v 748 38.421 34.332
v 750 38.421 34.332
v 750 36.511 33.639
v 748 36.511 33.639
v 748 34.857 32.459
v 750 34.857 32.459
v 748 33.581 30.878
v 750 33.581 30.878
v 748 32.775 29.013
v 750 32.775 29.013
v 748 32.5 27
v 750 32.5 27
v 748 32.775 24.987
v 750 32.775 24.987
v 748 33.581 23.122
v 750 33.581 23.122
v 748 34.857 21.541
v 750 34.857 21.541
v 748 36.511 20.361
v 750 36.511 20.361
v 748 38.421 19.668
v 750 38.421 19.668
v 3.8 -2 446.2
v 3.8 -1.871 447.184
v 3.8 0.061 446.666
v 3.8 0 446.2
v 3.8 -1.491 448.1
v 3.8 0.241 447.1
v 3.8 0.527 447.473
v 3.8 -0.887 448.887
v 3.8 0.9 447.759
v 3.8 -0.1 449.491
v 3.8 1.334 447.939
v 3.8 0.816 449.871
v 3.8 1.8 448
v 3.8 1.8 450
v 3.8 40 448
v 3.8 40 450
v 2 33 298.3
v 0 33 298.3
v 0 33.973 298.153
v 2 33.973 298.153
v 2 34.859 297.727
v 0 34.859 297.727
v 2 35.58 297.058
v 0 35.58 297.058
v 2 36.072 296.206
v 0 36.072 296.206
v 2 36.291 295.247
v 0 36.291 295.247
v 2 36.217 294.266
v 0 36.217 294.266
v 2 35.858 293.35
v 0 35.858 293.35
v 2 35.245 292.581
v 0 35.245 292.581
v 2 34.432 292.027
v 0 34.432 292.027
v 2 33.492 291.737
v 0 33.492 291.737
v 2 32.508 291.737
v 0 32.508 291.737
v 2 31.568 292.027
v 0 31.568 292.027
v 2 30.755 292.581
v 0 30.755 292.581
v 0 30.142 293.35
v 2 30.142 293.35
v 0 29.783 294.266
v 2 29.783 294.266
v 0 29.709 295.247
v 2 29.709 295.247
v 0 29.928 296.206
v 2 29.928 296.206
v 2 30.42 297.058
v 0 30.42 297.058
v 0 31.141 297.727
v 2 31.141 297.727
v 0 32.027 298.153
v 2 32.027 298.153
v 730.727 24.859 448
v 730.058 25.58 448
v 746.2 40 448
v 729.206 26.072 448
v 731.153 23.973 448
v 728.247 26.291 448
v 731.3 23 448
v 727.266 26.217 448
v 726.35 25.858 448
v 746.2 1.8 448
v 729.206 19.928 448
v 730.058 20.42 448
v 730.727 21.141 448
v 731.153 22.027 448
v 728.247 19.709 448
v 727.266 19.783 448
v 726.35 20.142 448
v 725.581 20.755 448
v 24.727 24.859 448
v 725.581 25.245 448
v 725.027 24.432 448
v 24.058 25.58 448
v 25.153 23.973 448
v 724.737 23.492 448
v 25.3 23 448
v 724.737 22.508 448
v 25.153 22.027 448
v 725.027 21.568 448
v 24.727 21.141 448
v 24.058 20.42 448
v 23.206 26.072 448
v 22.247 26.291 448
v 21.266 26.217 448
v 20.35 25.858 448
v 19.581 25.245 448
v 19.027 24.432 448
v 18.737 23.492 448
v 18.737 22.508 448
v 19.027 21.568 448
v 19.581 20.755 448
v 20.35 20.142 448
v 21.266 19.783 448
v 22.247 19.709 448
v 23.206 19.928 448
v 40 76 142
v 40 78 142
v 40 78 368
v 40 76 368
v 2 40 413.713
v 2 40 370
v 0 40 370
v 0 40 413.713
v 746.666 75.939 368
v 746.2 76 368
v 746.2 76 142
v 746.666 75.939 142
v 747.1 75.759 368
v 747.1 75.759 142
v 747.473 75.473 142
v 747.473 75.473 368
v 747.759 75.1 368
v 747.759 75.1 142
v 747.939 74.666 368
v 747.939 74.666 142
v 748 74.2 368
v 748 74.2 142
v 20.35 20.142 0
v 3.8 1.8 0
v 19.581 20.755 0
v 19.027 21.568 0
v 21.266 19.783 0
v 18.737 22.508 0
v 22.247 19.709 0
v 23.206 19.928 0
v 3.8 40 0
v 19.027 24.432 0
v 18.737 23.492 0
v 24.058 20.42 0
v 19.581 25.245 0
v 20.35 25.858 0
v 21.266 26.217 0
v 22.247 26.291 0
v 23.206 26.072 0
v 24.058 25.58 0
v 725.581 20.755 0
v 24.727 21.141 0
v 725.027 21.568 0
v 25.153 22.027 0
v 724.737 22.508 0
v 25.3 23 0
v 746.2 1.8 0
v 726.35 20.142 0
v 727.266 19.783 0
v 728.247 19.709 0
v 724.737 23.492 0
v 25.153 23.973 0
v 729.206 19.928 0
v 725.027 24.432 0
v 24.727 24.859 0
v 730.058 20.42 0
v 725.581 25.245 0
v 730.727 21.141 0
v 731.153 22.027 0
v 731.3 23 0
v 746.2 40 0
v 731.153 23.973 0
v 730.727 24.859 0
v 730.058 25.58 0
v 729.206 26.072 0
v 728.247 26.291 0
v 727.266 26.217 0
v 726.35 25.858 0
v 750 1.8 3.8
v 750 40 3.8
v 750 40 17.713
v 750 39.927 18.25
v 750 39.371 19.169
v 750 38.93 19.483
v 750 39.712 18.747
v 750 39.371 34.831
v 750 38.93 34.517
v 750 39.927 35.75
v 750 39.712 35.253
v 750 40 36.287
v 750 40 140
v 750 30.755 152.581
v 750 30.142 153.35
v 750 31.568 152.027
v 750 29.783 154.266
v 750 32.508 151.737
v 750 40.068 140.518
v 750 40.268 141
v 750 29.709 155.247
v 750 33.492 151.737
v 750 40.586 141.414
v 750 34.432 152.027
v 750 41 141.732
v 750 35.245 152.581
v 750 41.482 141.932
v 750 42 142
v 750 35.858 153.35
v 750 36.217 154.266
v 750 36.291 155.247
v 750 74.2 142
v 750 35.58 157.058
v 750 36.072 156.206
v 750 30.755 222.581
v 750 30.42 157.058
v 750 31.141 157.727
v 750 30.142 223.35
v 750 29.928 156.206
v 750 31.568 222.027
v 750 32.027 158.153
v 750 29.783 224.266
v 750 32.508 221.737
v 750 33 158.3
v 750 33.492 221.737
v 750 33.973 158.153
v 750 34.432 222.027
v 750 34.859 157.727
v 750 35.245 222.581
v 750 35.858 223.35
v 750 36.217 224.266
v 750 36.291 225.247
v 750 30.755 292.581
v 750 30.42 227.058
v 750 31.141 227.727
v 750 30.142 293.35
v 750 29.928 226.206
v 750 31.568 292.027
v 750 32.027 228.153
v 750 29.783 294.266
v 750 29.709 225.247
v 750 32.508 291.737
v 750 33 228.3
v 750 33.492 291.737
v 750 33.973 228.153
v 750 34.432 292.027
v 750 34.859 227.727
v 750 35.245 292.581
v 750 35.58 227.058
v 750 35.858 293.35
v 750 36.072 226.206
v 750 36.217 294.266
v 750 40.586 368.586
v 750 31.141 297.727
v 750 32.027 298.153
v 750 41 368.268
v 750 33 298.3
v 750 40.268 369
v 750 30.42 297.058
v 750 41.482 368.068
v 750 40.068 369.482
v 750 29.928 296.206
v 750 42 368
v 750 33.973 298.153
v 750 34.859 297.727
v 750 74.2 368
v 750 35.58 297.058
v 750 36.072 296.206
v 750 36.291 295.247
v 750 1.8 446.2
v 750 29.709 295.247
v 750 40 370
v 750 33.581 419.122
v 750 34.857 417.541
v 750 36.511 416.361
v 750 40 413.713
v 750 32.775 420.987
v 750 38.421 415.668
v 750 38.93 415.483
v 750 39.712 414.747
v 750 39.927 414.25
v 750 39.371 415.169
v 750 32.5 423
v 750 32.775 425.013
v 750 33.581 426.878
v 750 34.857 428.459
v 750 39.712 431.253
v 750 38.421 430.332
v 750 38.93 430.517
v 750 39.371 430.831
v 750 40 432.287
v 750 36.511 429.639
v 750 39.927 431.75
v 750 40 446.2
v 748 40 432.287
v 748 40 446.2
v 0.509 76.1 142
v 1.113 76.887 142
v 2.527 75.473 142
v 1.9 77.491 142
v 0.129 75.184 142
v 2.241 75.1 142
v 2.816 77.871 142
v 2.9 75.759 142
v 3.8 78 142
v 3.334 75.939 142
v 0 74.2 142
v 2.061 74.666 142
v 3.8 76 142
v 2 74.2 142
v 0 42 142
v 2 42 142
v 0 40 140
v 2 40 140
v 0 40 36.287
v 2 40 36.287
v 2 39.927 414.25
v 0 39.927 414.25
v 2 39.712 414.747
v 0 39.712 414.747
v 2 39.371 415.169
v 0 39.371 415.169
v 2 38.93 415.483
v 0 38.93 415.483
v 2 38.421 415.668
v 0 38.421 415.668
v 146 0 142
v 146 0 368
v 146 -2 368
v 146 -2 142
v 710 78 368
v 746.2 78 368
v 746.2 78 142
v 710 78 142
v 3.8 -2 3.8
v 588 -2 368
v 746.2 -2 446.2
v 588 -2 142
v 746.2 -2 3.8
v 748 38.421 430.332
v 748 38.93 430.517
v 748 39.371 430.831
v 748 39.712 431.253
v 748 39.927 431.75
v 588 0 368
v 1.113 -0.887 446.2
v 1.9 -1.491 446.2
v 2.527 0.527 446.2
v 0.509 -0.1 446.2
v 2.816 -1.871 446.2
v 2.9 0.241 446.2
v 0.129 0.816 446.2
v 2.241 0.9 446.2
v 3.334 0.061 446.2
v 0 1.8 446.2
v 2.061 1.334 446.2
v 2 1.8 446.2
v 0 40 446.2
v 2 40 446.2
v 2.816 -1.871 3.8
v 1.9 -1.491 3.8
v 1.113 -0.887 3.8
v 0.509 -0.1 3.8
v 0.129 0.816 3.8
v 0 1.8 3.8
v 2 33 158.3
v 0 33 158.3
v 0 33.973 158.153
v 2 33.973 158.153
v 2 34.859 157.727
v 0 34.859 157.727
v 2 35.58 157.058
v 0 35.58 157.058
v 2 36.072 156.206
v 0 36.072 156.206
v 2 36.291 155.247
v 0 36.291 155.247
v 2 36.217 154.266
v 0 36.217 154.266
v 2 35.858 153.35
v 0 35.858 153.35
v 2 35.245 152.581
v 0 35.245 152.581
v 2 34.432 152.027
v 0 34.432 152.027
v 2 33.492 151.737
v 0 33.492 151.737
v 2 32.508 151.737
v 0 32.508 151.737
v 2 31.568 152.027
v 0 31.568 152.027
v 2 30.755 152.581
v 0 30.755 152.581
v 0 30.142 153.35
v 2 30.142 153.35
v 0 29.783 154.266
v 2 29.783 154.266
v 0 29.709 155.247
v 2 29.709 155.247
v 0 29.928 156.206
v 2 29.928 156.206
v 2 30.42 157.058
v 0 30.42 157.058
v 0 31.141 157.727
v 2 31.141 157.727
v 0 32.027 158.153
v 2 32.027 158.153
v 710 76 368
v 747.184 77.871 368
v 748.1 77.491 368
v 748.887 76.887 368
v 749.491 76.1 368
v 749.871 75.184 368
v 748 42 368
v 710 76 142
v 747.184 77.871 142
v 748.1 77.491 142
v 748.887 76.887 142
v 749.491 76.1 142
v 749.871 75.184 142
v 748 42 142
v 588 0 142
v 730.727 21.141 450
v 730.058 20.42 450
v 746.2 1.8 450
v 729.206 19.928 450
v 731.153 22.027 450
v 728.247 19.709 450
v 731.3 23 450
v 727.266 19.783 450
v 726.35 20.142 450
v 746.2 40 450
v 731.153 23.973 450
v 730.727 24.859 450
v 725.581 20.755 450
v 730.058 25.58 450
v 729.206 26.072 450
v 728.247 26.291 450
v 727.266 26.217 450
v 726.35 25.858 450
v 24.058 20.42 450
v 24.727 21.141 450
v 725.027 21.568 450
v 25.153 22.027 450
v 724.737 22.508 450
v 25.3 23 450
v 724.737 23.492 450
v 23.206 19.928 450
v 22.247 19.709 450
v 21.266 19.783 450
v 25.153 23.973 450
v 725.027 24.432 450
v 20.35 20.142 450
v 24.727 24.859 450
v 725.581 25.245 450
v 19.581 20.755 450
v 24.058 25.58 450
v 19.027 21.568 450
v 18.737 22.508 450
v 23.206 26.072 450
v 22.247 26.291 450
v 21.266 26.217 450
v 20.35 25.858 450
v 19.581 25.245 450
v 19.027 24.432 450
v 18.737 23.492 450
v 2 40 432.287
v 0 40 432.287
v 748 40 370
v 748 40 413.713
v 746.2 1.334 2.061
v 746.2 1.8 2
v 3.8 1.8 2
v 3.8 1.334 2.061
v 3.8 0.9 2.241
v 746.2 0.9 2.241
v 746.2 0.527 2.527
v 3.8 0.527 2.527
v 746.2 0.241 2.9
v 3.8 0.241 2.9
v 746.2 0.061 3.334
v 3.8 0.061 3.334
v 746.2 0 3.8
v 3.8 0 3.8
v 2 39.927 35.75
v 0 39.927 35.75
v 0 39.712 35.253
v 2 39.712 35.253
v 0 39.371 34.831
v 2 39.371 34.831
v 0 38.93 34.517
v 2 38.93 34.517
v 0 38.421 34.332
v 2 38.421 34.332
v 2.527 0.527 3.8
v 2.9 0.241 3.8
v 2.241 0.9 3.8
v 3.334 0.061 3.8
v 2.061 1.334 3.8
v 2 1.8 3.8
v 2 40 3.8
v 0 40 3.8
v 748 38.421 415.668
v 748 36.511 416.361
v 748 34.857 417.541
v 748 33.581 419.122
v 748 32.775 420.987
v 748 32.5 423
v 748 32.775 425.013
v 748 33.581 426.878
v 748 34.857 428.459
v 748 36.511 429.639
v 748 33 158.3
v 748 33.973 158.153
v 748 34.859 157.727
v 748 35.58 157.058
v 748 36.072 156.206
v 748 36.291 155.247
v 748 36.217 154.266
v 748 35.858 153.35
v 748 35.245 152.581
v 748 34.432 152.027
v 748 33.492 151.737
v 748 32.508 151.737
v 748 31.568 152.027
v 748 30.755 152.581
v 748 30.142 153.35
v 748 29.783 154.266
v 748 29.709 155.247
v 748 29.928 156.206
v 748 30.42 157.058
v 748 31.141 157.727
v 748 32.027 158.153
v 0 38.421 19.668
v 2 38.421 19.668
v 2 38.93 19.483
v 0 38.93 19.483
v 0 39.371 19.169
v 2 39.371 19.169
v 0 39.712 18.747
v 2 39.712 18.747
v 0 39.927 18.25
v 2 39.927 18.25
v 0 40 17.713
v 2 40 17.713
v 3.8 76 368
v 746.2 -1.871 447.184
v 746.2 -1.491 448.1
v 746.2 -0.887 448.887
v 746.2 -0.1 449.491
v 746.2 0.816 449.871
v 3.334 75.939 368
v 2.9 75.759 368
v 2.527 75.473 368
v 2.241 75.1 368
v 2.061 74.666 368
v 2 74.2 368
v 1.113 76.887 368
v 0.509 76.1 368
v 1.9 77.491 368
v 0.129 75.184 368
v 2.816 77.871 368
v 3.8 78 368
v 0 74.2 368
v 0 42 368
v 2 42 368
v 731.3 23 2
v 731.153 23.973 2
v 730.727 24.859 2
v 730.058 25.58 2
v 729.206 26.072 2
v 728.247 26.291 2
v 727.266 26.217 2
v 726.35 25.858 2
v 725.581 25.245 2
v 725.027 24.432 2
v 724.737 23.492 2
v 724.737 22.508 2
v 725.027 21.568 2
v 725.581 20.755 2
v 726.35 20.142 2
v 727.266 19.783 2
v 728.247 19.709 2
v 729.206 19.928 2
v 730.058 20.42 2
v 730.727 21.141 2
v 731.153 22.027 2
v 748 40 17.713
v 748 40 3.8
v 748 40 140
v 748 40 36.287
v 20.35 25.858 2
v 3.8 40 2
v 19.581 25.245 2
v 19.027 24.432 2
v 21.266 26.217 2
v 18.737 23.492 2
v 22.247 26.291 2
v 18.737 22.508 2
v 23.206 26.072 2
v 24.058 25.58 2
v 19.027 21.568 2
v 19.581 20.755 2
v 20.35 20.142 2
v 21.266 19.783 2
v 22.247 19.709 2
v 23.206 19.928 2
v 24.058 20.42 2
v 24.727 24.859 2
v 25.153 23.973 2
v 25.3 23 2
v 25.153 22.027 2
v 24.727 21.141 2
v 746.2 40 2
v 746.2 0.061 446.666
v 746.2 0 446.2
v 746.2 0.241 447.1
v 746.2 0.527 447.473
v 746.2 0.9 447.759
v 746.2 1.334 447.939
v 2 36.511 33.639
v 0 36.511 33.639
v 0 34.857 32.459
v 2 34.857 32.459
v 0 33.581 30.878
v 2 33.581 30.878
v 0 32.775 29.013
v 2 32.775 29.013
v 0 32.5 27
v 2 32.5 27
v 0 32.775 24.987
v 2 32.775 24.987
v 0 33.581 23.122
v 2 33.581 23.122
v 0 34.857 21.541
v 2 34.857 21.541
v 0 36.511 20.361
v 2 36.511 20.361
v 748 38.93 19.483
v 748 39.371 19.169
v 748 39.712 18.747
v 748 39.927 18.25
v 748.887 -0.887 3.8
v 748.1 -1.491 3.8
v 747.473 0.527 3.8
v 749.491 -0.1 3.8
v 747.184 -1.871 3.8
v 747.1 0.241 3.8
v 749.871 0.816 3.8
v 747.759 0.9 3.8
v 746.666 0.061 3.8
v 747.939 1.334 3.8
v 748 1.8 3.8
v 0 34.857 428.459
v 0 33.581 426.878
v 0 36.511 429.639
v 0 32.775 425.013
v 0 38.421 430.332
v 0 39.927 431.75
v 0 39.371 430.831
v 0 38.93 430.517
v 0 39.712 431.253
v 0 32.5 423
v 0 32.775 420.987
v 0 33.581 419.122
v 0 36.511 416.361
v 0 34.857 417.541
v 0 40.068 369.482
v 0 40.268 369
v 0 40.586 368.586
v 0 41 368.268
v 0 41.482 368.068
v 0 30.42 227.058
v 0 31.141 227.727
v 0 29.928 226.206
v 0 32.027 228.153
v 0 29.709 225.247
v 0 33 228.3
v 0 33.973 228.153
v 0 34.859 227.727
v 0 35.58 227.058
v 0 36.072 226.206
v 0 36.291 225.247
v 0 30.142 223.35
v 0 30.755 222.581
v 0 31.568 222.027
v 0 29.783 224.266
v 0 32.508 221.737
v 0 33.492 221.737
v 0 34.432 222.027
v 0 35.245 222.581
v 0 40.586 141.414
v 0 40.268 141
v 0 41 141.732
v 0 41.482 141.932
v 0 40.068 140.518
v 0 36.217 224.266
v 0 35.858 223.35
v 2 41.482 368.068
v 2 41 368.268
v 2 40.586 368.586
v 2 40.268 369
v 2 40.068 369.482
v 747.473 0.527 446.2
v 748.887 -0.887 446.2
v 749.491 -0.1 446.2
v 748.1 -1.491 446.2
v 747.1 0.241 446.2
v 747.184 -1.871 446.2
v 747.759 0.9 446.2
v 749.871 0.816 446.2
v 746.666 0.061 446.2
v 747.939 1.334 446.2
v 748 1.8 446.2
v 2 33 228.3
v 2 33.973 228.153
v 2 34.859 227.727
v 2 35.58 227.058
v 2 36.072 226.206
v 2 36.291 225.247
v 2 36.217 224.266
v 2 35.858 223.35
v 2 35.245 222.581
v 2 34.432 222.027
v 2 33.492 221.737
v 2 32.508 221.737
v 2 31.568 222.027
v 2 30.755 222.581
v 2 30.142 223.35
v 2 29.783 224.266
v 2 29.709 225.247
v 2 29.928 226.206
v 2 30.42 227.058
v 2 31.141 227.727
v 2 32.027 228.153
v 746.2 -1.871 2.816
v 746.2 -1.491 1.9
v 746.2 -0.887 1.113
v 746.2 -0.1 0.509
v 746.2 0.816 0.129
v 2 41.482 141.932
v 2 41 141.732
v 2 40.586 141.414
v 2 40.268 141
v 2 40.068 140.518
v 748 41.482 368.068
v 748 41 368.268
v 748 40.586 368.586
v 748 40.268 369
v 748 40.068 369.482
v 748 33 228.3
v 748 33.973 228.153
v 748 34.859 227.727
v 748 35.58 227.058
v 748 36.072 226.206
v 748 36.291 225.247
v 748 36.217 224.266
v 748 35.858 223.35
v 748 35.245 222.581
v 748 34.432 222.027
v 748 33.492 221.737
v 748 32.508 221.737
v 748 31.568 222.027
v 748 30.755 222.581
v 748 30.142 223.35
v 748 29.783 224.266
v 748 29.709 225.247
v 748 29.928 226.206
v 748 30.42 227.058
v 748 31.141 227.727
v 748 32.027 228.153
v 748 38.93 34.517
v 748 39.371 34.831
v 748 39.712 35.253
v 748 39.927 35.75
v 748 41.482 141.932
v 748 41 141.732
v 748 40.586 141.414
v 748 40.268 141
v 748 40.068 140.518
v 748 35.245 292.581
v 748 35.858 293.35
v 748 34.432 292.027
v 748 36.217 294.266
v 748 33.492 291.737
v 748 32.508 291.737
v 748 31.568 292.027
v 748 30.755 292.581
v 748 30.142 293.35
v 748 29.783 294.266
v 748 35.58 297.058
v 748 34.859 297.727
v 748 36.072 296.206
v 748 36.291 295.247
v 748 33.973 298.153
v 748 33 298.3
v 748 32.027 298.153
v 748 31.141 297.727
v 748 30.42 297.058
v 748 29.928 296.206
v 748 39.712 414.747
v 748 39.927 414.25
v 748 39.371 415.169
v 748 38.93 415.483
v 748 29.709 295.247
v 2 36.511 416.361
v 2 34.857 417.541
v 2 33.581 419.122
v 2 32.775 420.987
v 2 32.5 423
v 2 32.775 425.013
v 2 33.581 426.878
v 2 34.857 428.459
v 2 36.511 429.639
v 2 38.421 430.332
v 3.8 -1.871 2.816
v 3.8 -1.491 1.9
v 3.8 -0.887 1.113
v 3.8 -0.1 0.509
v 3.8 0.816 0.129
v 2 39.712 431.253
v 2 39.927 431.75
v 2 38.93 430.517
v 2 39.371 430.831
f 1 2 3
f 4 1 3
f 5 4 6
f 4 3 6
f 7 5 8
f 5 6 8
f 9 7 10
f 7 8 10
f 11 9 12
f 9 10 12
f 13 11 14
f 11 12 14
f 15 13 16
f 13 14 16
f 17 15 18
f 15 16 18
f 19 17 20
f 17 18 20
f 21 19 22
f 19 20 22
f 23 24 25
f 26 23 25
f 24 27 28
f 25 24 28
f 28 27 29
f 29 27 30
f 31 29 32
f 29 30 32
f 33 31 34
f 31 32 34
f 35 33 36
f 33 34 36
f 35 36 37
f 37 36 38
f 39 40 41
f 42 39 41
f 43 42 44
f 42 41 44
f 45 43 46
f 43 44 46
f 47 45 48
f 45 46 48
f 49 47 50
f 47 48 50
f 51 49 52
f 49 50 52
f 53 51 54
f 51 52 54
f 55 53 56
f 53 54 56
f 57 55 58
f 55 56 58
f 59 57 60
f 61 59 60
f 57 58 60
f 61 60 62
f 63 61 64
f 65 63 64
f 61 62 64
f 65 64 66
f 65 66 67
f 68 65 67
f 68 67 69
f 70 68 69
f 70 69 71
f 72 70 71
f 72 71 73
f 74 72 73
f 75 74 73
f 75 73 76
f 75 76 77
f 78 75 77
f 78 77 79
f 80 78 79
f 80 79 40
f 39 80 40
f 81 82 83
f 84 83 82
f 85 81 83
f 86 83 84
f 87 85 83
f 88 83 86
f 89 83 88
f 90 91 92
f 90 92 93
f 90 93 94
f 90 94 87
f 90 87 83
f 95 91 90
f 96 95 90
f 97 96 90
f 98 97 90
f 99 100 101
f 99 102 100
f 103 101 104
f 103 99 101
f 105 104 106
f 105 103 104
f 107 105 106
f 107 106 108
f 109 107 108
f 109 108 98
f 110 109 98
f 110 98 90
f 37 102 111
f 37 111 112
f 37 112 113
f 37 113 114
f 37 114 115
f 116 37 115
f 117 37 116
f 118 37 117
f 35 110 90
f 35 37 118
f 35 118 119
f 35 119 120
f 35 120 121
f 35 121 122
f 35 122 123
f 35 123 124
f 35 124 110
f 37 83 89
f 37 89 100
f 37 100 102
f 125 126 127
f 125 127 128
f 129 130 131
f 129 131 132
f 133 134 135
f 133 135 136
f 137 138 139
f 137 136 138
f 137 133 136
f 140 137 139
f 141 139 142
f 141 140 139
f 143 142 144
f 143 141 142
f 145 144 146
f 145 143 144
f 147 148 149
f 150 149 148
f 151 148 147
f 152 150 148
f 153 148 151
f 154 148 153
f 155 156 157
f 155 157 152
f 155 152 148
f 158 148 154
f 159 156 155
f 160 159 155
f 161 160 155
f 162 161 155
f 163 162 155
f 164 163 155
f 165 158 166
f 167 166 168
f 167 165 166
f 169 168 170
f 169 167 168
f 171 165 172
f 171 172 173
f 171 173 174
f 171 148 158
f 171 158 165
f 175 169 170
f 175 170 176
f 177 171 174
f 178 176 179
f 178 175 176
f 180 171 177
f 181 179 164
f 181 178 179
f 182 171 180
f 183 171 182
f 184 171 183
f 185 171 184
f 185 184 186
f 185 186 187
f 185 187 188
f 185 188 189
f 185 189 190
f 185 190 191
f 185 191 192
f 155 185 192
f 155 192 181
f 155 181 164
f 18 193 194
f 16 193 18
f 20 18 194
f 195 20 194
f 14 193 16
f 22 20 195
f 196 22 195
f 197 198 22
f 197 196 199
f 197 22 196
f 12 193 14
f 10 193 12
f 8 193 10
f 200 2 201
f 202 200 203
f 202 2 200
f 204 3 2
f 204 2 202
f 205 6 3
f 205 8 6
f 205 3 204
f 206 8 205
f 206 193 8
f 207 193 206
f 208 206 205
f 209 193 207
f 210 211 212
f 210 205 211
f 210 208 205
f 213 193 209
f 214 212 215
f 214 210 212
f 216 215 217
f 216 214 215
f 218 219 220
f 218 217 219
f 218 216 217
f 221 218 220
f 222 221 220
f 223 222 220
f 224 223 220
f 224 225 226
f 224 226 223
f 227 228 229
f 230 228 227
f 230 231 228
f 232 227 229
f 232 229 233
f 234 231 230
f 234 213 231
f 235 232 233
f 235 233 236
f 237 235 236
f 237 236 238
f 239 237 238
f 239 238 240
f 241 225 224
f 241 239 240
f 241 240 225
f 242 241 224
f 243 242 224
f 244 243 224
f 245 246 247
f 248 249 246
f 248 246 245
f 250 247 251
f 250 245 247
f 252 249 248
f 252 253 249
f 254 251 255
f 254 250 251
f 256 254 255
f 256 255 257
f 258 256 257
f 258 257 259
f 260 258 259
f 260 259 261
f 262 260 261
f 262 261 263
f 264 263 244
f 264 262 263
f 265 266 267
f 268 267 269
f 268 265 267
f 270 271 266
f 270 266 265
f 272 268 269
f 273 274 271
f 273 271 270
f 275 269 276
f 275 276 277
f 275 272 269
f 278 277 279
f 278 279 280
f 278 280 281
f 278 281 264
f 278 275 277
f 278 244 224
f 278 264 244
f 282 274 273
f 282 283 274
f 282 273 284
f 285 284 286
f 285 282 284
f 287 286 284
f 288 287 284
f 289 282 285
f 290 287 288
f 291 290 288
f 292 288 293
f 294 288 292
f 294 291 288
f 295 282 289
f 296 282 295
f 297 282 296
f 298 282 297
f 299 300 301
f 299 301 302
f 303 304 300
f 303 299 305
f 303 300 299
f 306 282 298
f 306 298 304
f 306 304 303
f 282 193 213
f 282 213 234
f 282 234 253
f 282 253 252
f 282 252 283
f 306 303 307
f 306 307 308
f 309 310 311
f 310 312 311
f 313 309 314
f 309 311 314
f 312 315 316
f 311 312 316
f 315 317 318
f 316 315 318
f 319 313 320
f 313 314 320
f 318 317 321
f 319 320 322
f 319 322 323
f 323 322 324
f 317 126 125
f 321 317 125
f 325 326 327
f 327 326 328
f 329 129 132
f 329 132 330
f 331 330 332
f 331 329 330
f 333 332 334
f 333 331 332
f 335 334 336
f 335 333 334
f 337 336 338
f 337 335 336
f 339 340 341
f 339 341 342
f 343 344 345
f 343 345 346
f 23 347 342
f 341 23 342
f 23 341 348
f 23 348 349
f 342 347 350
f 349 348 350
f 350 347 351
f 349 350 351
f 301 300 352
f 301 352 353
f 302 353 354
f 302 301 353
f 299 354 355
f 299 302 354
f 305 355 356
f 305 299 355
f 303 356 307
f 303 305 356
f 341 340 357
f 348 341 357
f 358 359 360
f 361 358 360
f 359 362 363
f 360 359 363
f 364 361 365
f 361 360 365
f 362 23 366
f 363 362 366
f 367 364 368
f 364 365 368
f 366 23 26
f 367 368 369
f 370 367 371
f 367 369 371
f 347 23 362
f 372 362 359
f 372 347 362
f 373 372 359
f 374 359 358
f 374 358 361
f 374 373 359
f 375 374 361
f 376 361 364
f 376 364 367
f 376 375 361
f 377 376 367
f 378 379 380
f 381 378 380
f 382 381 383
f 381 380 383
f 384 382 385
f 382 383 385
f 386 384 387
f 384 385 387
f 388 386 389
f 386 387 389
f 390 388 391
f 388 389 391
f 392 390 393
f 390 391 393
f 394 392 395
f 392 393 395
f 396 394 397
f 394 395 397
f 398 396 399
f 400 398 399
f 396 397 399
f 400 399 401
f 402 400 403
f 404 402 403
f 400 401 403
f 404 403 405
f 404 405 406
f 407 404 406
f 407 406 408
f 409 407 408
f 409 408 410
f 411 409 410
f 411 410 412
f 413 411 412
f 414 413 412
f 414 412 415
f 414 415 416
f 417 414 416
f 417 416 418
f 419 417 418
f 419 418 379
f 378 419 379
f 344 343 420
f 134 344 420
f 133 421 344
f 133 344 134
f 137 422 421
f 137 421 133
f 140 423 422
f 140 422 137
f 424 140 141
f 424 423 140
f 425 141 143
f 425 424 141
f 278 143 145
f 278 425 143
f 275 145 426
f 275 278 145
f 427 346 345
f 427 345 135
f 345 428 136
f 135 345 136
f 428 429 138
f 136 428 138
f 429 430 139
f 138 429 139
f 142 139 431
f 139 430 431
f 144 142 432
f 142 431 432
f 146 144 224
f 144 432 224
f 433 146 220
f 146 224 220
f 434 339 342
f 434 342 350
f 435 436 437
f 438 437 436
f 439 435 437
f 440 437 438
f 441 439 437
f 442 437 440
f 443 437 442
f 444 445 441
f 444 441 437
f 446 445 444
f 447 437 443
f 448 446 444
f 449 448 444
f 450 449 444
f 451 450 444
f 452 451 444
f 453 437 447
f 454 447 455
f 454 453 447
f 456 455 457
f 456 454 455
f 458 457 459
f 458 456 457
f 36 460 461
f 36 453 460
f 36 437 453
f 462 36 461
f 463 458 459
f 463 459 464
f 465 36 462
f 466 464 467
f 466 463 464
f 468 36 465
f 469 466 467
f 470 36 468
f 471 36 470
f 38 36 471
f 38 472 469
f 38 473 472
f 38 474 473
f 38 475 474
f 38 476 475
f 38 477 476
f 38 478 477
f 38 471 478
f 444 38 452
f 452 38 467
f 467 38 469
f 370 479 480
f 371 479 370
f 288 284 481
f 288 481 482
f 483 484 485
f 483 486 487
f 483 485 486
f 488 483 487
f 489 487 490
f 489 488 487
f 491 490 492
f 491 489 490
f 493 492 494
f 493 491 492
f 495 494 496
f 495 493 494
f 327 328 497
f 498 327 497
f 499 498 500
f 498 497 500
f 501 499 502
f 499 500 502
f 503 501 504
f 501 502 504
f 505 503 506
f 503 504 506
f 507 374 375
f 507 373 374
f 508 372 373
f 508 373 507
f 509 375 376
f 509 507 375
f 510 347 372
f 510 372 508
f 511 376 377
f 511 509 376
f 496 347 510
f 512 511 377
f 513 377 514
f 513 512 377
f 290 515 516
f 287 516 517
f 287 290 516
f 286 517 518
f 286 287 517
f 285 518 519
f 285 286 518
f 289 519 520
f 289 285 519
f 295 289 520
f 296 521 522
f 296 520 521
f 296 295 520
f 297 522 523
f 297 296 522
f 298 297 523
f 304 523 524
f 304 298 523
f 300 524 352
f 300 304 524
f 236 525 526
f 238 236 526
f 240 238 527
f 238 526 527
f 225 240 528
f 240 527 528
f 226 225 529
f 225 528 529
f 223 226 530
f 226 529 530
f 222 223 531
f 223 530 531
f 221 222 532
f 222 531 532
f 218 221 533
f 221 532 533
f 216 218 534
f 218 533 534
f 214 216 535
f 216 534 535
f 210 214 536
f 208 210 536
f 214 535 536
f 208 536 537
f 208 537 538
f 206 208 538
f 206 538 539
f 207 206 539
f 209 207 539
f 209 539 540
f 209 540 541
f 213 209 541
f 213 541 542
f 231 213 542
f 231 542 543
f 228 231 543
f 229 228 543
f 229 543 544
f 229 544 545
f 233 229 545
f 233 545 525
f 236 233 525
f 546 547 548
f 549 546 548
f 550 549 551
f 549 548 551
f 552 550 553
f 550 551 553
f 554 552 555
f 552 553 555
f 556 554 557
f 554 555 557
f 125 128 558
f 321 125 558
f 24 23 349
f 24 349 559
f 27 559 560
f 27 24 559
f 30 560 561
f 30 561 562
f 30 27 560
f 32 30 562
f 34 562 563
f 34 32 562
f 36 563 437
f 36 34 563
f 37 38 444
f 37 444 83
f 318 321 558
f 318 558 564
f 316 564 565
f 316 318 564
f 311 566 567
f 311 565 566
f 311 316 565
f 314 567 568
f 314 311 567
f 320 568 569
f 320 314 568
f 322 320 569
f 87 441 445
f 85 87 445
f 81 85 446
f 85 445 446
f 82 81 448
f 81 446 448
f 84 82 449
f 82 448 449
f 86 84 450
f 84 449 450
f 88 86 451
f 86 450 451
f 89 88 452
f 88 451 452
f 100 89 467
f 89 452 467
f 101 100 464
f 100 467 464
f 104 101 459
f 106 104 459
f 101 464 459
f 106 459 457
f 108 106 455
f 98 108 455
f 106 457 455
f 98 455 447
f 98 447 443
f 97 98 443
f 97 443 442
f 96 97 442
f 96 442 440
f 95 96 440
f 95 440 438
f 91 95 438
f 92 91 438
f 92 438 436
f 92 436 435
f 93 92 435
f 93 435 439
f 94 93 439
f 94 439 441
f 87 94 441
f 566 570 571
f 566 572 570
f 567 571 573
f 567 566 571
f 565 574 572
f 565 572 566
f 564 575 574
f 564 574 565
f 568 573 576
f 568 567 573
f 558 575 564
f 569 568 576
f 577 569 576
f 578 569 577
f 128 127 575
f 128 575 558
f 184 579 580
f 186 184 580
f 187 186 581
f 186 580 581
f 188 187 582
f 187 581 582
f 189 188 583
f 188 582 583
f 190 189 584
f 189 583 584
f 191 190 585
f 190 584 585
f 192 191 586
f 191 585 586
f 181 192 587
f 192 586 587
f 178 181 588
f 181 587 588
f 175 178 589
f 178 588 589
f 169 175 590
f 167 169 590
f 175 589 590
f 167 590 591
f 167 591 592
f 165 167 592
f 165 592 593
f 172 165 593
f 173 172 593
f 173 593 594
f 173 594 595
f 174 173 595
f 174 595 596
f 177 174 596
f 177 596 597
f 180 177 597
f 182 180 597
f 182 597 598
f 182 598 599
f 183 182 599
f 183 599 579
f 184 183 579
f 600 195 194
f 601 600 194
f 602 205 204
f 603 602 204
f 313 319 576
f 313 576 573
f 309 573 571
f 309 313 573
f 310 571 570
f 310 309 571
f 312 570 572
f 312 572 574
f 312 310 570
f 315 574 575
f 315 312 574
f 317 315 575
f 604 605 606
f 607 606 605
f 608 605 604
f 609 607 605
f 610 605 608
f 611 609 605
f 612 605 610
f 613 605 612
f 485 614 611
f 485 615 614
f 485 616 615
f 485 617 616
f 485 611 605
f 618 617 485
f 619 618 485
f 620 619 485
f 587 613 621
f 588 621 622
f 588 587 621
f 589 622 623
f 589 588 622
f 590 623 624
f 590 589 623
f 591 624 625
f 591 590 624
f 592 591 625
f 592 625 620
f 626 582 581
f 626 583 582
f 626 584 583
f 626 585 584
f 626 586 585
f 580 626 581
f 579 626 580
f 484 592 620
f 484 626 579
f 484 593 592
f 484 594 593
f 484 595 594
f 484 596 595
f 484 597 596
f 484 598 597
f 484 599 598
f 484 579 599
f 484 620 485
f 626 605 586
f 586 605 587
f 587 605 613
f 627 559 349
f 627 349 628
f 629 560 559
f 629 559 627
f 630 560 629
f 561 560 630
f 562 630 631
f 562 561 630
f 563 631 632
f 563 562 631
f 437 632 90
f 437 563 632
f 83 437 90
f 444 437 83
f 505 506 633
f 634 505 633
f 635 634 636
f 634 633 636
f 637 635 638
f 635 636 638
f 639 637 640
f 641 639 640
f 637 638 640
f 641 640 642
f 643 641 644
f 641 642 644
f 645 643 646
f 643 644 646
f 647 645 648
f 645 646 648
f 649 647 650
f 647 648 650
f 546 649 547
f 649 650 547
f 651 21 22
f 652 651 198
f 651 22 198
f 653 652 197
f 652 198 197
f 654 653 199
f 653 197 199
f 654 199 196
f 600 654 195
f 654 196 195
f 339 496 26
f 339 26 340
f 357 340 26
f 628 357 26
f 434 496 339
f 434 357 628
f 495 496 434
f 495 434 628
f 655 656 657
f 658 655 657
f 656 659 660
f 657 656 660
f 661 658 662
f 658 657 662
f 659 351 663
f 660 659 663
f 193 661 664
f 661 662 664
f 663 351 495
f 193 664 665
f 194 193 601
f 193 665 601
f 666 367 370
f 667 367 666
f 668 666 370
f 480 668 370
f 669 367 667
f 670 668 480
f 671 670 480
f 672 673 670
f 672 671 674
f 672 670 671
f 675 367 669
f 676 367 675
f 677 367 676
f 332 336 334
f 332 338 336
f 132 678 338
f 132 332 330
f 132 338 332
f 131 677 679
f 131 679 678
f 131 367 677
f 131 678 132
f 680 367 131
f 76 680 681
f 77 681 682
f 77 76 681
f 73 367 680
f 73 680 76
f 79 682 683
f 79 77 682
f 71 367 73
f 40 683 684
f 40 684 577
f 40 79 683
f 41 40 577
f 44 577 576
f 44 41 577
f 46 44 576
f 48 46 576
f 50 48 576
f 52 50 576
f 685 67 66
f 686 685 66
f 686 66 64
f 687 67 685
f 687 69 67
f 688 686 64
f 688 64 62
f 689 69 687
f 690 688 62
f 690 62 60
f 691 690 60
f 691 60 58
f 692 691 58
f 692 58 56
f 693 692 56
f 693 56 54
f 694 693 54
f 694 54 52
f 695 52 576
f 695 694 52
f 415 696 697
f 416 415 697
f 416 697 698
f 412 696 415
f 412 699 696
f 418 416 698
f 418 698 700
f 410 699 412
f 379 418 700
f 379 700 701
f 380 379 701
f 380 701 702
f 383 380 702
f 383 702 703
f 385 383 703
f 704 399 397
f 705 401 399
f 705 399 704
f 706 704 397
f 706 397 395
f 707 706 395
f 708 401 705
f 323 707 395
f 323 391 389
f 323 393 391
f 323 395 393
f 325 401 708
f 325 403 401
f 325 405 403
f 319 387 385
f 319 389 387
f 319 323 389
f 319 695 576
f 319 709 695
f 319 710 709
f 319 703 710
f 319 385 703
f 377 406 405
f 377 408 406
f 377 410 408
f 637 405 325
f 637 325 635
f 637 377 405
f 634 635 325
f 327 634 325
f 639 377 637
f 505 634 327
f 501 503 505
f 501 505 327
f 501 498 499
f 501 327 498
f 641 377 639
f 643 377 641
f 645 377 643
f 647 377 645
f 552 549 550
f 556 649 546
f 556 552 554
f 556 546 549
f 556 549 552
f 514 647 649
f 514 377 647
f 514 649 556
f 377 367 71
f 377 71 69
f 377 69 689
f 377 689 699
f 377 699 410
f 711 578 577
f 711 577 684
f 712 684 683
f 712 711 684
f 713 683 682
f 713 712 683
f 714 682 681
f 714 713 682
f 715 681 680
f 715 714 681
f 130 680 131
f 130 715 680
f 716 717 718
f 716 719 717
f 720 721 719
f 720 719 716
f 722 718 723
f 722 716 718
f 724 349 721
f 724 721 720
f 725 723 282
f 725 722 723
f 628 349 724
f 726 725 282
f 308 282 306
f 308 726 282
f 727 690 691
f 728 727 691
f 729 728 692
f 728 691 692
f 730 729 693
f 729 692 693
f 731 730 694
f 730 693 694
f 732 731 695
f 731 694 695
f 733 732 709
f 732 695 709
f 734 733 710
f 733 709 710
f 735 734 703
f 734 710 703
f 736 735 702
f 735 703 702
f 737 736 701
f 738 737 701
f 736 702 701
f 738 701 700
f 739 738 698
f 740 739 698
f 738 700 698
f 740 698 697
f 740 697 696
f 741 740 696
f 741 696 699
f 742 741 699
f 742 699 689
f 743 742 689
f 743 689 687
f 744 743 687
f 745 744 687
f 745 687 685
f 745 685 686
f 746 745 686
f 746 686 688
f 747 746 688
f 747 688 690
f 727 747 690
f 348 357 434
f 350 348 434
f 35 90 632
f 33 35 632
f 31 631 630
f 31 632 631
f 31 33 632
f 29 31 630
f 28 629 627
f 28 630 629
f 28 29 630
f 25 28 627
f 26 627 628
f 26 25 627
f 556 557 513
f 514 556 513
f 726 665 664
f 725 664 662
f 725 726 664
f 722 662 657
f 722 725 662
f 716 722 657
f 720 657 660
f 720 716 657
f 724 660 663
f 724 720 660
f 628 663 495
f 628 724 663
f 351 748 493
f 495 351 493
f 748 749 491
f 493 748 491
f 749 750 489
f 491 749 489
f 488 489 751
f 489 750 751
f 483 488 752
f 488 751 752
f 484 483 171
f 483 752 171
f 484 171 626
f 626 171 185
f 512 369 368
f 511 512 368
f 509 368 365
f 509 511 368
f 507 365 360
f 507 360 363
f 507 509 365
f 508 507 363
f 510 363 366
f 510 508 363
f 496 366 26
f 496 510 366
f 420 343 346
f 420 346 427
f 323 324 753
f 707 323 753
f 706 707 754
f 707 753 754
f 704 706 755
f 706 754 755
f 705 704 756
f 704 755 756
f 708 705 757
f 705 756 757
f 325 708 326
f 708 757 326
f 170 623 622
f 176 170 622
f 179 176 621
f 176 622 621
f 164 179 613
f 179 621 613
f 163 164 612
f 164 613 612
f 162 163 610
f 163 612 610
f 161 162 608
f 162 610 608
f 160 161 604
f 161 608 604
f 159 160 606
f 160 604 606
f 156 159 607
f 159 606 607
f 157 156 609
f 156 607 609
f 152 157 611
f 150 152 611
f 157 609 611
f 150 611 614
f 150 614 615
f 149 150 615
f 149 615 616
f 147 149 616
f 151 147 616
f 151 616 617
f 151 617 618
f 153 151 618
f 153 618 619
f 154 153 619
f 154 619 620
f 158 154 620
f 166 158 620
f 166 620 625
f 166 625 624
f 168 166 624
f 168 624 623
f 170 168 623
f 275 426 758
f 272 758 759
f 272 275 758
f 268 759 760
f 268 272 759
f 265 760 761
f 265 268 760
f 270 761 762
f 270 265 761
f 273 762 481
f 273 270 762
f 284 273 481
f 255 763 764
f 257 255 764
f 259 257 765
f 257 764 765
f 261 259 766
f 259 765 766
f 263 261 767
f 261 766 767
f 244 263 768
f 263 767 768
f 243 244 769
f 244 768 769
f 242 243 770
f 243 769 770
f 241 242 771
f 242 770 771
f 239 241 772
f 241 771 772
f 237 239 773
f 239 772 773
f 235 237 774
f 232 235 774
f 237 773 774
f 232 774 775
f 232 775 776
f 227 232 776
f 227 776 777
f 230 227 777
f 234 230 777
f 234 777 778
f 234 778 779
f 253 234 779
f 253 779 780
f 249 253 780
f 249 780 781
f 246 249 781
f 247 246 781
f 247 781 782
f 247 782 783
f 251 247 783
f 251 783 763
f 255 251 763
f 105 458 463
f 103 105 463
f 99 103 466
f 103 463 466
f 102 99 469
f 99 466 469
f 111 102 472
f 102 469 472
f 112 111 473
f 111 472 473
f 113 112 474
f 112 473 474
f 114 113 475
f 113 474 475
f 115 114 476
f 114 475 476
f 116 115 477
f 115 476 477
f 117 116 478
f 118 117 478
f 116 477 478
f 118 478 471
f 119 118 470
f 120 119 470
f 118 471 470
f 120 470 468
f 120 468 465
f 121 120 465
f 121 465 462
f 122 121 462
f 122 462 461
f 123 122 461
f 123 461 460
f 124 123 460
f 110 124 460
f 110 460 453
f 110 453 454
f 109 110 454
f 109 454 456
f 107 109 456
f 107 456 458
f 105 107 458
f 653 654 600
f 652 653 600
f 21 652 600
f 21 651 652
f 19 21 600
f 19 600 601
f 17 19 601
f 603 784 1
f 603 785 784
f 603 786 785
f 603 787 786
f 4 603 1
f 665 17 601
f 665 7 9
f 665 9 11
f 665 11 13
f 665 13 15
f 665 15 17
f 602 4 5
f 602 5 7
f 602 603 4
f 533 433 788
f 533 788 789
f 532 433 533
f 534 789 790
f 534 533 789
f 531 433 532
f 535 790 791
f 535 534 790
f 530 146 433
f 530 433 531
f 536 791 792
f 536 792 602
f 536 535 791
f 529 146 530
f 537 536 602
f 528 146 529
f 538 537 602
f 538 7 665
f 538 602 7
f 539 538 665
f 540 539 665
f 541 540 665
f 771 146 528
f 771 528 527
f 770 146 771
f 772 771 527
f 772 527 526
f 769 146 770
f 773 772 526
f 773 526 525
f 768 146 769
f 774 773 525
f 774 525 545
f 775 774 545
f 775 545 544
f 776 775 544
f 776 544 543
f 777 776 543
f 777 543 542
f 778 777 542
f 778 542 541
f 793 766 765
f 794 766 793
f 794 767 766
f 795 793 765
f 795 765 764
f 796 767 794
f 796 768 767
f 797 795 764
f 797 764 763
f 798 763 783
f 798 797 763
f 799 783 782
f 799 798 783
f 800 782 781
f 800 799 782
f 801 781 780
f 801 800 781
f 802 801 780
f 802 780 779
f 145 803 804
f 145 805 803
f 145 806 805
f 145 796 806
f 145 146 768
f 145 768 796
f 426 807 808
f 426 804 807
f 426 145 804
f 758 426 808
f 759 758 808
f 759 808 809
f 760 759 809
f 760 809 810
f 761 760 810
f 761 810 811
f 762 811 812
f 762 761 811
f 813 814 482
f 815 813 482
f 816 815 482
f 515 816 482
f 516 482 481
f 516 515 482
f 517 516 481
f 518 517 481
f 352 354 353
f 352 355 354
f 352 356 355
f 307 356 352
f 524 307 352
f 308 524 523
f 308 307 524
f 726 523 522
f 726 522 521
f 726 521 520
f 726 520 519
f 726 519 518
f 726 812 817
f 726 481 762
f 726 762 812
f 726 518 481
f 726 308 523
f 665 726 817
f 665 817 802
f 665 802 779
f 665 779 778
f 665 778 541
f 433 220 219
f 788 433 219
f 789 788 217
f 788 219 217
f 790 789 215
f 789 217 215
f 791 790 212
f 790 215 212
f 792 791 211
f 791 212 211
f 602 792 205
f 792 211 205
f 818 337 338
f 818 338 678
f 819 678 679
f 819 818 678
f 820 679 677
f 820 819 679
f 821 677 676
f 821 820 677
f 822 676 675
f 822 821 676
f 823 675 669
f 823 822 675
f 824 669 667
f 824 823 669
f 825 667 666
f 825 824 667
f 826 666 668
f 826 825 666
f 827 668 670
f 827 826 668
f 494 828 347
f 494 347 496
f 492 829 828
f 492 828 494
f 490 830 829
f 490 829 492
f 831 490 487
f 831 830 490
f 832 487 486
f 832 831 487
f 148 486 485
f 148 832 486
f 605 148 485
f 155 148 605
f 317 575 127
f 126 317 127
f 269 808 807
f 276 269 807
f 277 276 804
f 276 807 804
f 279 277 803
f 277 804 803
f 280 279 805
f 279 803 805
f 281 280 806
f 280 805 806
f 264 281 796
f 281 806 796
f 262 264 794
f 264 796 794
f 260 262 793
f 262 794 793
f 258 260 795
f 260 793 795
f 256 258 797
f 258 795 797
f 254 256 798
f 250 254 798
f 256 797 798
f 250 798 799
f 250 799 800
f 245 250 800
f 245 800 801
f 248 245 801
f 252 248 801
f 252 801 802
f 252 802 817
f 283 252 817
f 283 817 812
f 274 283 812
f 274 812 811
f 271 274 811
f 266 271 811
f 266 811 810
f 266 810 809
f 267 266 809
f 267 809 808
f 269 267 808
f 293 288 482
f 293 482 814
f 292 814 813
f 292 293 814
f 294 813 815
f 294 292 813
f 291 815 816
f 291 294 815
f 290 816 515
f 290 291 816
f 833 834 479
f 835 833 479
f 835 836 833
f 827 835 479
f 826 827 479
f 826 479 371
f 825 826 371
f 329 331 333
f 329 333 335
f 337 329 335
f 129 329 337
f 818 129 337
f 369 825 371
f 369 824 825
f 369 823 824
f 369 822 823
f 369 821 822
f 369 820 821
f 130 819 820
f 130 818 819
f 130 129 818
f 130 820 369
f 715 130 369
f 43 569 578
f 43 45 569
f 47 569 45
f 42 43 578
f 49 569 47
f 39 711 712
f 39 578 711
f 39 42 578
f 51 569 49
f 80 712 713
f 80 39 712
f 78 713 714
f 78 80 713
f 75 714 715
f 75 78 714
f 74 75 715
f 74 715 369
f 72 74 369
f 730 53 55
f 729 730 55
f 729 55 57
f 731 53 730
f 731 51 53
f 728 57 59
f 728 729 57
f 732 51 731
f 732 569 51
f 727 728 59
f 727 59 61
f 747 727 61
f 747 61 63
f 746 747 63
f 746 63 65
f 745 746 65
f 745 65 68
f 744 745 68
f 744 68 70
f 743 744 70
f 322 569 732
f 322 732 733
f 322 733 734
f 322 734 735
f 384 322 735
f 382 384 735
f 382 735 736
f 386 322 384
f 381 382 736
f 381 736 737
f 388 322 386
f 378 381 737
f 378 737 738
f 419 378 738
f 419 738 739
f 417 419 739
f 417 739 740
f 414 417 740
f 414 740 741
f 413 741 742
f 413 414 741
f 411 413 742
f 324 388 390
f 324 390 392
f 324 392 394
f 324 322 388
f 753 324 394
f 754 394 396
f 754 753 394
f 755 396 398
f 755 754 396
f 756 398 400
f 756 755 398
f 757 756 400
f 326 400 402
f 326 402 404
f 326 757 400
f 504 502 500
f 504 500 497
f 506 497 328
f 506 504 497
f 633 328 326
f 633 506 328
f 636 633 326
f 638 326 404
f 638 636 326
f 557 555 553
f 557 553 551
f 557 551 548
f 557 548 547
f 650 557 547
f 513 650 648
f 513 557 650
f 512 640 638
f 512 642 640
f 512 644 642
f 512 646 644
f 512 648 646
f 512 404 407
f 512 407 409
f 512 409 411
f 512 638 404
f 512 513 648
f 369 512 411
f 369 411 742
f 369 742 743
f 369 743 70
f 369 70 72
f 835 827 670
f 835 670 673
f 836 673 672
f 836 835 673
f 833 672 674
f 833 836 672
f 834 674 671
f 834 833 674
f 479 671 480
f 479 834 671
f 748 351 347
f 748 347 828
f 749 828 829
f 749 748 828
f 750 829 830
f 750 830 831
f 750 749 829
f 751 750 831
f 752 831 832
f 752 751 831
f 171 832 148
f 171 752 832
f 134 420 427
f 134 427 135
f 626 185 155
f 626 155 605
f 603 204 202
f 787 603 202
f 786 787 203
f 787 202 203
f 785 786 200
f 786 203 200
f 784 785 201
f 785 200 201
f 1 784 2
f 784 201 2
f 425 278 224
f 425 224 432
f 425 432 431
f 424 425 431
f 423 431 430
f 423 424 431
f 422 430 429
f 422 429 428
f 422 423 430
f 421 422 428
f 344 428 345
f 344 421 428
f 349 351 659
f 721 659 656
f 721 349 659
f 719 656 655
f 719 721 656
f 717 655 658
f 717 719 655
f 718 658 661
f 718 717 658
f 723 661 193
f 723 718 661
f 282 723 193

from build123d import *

# Parameters (mm, degrees)
SKETCH_1_W                         = 750
SKETCH_1_H                         = 2
SM_BASE_FLANGE_1_DEPTH             = 450
SM_EDGE_FLANGE_1_STRIP_W           = 11.6
SM_EDGE_FLANGE_1_STRIP_H           = 2
SM_EDGE_FLANGE_1_STRIP_CUT_DEPTH   = 750
SM_EDGE_FLANGE_1_STRIP_2_W         = 11.6
SM_EDGE_FLANGE_1_STRIP_2_H         = 2
SM_EDGE_FLANGE_1_STRIP_CUT_2_DEPTH = 750
SM_EDGE_FLANGE_1_DEPTH             = 750
SM_EDGE_FLANGE_1_BEND_DEPTH        = 750
SM_EDGE_FLANGE_2_STRIP_W           = 11.6
SM_EDGE_FLANGE_2_STRIP_H           = 2
SM_EDGE_FLANGE_2_STRIP_CUT_DEPTH   = 442.4
SM_EDGE_FLANGE_2_STRIP_2_W         = 11.6
SM_EDGE_FLANGE_2_STRIP_2_H         = 2
SM_EDGE_FLANGE_2_STRIP_CUT_2_DEPTH = 442.4
SM_EDGE_FLANGE_2_DEPTH             = 442.4
SM_EDGE_FLANGE_2_BEND_DEPTH        = 442.4
CUT_EXTRUDE_1_REACH                = 880.114
SKETCH_19_W                        = 3.8
SKETCH_19_H                        = 42
SKETCH_20_W                        = 3.8
SKETCH_20_H                        = 42
CUT_EXTRUDE_2_DEPTH                = 3.8
SKETCH_21_W                        = 442
SKETCH_21_H                        = 226
CUT_EXTRUDE_3_DEPTH                = 10
SM_EDGE_FLANGE_3_STRIP_W           = 11.6
SM_EDGE_FLANGE_3_STRIP_H           = 2
SM_EDGE_FLANGE_3_STRIP_CUT_DEPTH   = 442.4
SM_EDGE_FLANGE_3_STRIP_2_W         = 11.6
SM_EDGE_FLANGE_3_STRIP_2_H         = 2
SM_EDGE_FLANGE_3_STRIP_CUT_2_DEPTH = 442.4
SM_EDGE_FLANGE_3_DEPTH             = 442.4
SM_EDGE_FLANGE_3_BEND_DEPTH        = 442.4
CUT_EXTRUDE_4_DEPTH                = 879.11388783
HOLE_WIZARD_M61_D                  = 6.6
HOLE_WIZARD_M62_D                  = 6.6


# Sheet-metal steps are written as plain solids
with BuildPart() as part:
    # Sketch 1 → Базовая кромка1 (new body)
    with BuildSketch(Plane.XY):
        with Locations((375, -1)):
            Rectangle(SKETCH_1_W, SKETCH_1_H)
    extrude(amount=SM_BASE_FLANGE_1_DEPTH)

    # Ребро-кромка1 strip (across the edge) → Ребро-кромка1 strip cut (cut)
    with BuildSketch(Plane(origin=(0, 0, 450), x_dir=(0, 0, -1), z_dir=(1, 0, 0))):
        with Locations((-2, -1)):
            Rectangle(SM_EDGE_FLANGE_1_STRIP_W, SM_EDGE_FLANGE_1_STRIP_H)
    extrude(amount=SM_EDGE_FLANGE_1_STRIP_CUT_DEPTH, mode=Mode.SUBTRACT)

    # Ребро-кромка1 strip 2 (across the edge) → Ребро-кромка1 strip cut 2 (cut)
    with BuildSketch(Plane.ZY.offset(-750)):
        with Locations((-2, -1)):
            Rectangle(SM_EDGE_FLANGE_1_STRIP_2_W, SM_EDGE_FLANGE_1_STRIP_2_H)
    extrude(amount=SM_EDGE_FLANGE_1_STRIP_CUT_2_DEPTH, mode=Mode.SUBTRACT)

    # Ребро-кромка1 section (across the edge) → Ребро-кромка1 (add)
    with BuildSketch(Plane(origin=(0, 0, 450), x_dir=(0, 0, -1), z_dir=(1, 0, 0))):
        with BuildLine():
            Line((0, 1.8), (0, 40))
            Line((0, 40), (2, 40))
            Line((2, 40), (2, 1.8))
            ThreePointArc((2, 1.8), (2.527207794, 0.527207794), (3.8, 0))
            Line((3.8, 0), (3.8, -2))
            ThreePointArc((3.8, -2), (1.112994231, -0.887005769), (0, 1.8))
        make_face()
    extrude(amount=SM_EDGE_FLANGE_1_DEPTH)

    # Ребро-кромка1 section 2 (across the edge) → Ребро-кромка1 bend (add)
    with BuildSketch(Plane.ZY.offset(-750)):
        with BuildLine():
            Line((0, 1.8), (0, 40))
            Line((0, 40), (2, 40))
            Line((2, 40), (2, 1.8))
            ThreePointArc((2, 1.8), (2.527207794, 0.527207794), (3.8, 0))
            Line((3.8, 0), (3.8, -2))
            ThreePointArc((3.8, -2), (1.112994231, -0.887005769), (0, 1.8))
        make_face()
    extrude(amount=SM_EDGE_FLANGE_1_BEND_DEPTH)

    # Ребро-кромка2 strip (across the edge) → Ребро-кромка2 strip cut (cut)
    with BuildSketch(Plane.XY.offset(3.8)):
        with Locations((-2, -1)):
            Rectangle(SM_EDGE_FLANGE_2_STRIP_W, SM_EDGE_FLANGE_2_STRIP_H)
    extrude(amount=SM_EDGE_FLANGE_2_STRIP_CUT_DEPTH, mode=Mode.SUBTRACT)

    # Ребро-кромка2 strip 2 (across the edge) → Ребро-кромка2 strip cut 2 (cut)
    with BuildSketch(Plane(origin=(750, 0, 446.2), x_dir=(-1, 0, 0), z_dir=(0, 0, -1))):
        with Locations((-2, -1)):
            Rectangle(SM_EDGE_FLANGE_2_STRIP_2_W, SM_EDGE_FLANGE_2_STRIP_2_H)
    extrude(amount=SM_EDGE_FLANGE_2_STRIP_CUT_2_DEPTH, mode=Mode.SUBTRACT)

    # Ребро-кромка2 section (across the edge) → Ребро-кромка2 (add)
    with BuildSketch(Plane.XY.offset(3.8)):
        with BuildLine():
            Line((0, 1.8), (0, 78))
            Line((0, 78), (2, 78))
            Line((2, 78), (2, 1.8))
            ThreePointArc((2, 1.8), (2.527207794, 0.527207794), (3.8, 0))
            Line((3.8, 0), (3.8, -2))
            ThreePointArc((3.8, -2), (1.112994231, -0.887005769), (0, 1.8))
        make_face()
    extrude(amount=SM_EDGE_FLANGE_2_DEPTH)

    # Ребро-кромка2 section 2 (across the edge) → Ребро-кромка2 bend (add)
    with BuildSketch(Plane(origin=(750, 0, 446.2), x_dir=(-1, 0, 0), z_dir=(0, 0, -1))):
        with BuildLine():
            Line((0, 1.8), (0, 78))
            Line((0, 78), (2, 78))
            Line((2, 78), (2, 1.8))
            ThreePointArc((2, 1.8), (2.527207794, 0.527207794), (3.8, 0))
            Line((3.8, 0), (3.8, -2))
            ThreePointArc((3.8, -2), (1.112994231, -0.887005769), (0, 1.8))
        make_face()
    extrude(amount=SM_EDGE_FLANGE_2_BEND_DEPTH)

    # Вырез-Вытянуть1: up to this face of the body (flat: up to its plane)
    cut_extrude_1_end = Plane(part.part.faces().sort_by_distance((748.992300856, 38.893795601, 446.2))[0])
    # Эскиз19 → Вырез-Вытянуть1 (cut, up to the picked face)
    with BuildSketch(Plane.XY.offset(450), mode=Mode.PRIVATE) as cut_extrude_1_sk1:
        with Locations((1.9, 19)):
            Rectangle(SKETCH_19_W, SKETCH_19_H)
    cut_extrude_1_tool1 = split(extrude(cut_extrude_1_sk1.sketch, amount=-CUT_EXTRUDE_1_REACH, mode=Mode.PRIVATE), bisect_by=cut_extrude_1_end, keep=Keep.BOTH, mode=Mode.PRIVATE)
    # Эскиз19 → Вырез-Вытянуть1 (cut, up to the picked face)
    with BuildSketch(Plane.XY.offset(450), mode=Mode.PRIVATE) as cut_extrude_1_sk2:
        with Locations((748.1, 19)):
            Rectangle(SKETCH_19_W, SKETCH_19_H)
    cut_extrude_1_tool2 = split(extrude(cut_extrude_1_sk2.sketch, amount=-CUT_EXTRUDE_1_REACH, mode=Mode.PRIVATE), bisect_by=cut_extrude_1_end, keep=Keep.BOTH, mode=Mode.PRIVATE)
    add(cut_extrude_1_tool1.solids().sort_by(Axis((1.9, 19, 450), (0, 0, -1)))[0], mode=Mode.SUBTRACT)
    add(cut_extrude_1_tool2.solids().sort_by(Axis((748.1, 19, 450), (0, 0, -1)))[0], mode=Mode.SUBTRACT)

    # Эскиз20 → Вырез-Вытянуть2 (cut)
    with BuildSketch(Plane(origin=(0, 0, 0), x_dir=(-1, 0, 0), z_dir=(0, 0, -1))):
        with Locations((-748.1, 19)):
            Rectangle(SKETCH_20_W, SKETCH_20_H)
        with Locations((-1.9, 19)):
            Rectangle(SKETCH_20_W, SKETCH_20_H)
    extrude(amount=-CUT_EXTRUDE_2_DEPTH, mode=Mode.SUBTRACT)

    # Эскиз21 → Вырез-Вытянуть3 (cut)
    with BuildSketch(Plane(origin=(0, 0, 0), x_dir=(1, 0, 0), z_dir=(0, 1, 0))):
        with Locations((367, -255)):
            Rectangle(SKETCH_21_W, SKETCH_21_H)
    extrude(amount=-CUT_EXTRUDE_3_DEPTH, mode=Mode.SUBTRACT)

    # Ребро-кромка3 strip (across the edge) → Ребро-кромка3 strip cut (cut)
    with BuildSketch(Plane(origin=(748, 78, 446.2), x_dir=(0, -1, 0), z_dir=(0, 0, -1))):
        with Locations((-2, -1)):
            Rectangle(SM_EDGE_FLANGE_3_STRIP_W, SM_EDGE_FLANGE_3_STRIP_H)
    extrude(amount=SM_EDGE_FLANGE_3_STRIP_CUT_DEPTH, mode=Mode.SUBTRACT)

    # Ребро-кромка3 strip 2 (across the edge) → Ребро-кромка3 strip cut 2 (cut)
    with BuildSketch(Plane(origin=(2, 78, 3.8), x_dir=(0, -1, 0), z_dir=(0, 0, 1))):
        with Locations((-2, -1)):
            Rectangle(SM_EDGE_FLANGE_3_STRIP_2_W, SM_EDGE_FLANGE_3_STRIP_2_H)
    extrude(amount=SM_EDGE_FLANGE_3_STRIP_CUT_2_DEPTH, mode=Mode.SUBTRACT)

    # Ребро-кромка3 section (across the edge) → Ребро-кромка3 (add)
    with BuildSketch(Plane(origin=(748, 78, 446.2), x_dir=(0, -1, 0), z_dir=(0, 0, -1))):
        with BuildLine():
            Line((0, 1.8), (0, 38))
            Line((0, 38), (2, 38))
            Line((2, 38), (2, 1.8))
            ThreePointArc((2, 1.8), (2.527207794, 0.527207794), (3.8, 0))
            Line((3.8, 0), (3.8, -2))
            ThreePointArc((3.8, -2), (1.112994231, -0.887005769), (0, 1.8))
        make_face()
    extrude(amount=SM_EDGE_FLANGE_3_DEPTH)

    # Ребро-кромка3 section 2 (across the edge) → Ребро-кромка3 bend (add)
    with BuildSketch(Plane(origin=(2, 78, 3.8), x_dir=(0, -1, 0), z_dir=(0, 0, 1))):
        with BuildLine():
            Line((0, 1.8), (0, 38))
            Line((0, 38), (2, 38))
            Line((2, 38), (2, 1.8))
            ThreePointArc((2, 1.8), (2.527207794, 0.527207794), (3.8, 0))
            Line((3.8, 0), (3.8, -2))
            ThreePointArc((3.8, -2), (1.112994231, -0.887005769), (0, 1.8))
        make_face()
    extrude(amount=SM_EDGE_FLANGE_3_BEND_DEPTH)

    # Эскиз28 → Вырез-Вытянуть4 (cut, through all)
    with BuildSketch(Plane(origin=(750, 0, 0), x_dir=(0, 0, -1), z_dir=(1, 0, 0))):
        with BuildLine():
            Line((-446.2, 78), (-368, 78))
            Line((-368, 78), (-368, 42))
            ThreePointArc((-368, 42), (-368.585786438, 40.585786438), (-370, 40))
            Line((-370, 40), (-413.712912189, 40))
            ThreePointArc((-413.712912189, 40), (-414.969473914, 39.55597321), (-415.668088571, 38.421052632))
            ThreePointArc((-415.668088571, 38.421052632), (-423, 32.5), (-430.331911429, 38.421052632))
            ThreePointArc((-430.331911429, 38.421052632), (-431.030526086, 39.55597321), (-432.287087811, 40))
            Line((-432.287087811, 40), (-446.2, 40))
            Line((-446.2, 40), (-446.2, 78))
        make_face()
        with BuildLine():
            Line((-3.8, 78), (-142, 78))
            Line((-142, 78), (-142, 42))
            ThreePointArc((-142, 42), (-141.414213562, 40.585786438), (-140, 40))
            Line((-140, 40), (-36.287087811, 40))
            ThreePointArc((-36.287087811, 40), (-35.030526086, 39.55597321), (-34.331911429, 38.421052632))
            ThreePointArc((-34.331911429, 38.421052632), (-27, 32.5), (-19.668088571, 38.421052632))
            ThreePointArc((-19.668088571, 38.421052632), (-18.969473914, 39.55597321), (-17.712912189, 40))
            Line((-17.712912189, 40), (-3.8, 40))
            Line((-3.8, 40), (-3.8, 78))
        make_face()
    extrude(amount=-CUT_EXTRUDE_4_DEPTH, mode=Mode.SUBTRACT)

    # Отверстие с зазором M61 (through all)
    with Locations(Plane(origin=(0, 0, 0), x_dir=(-1, 0, 0), z_dir=(0, 0, -1))):
        with Locations((-728, 23), (-22, 23)):
            Hole(HOLE_WIZARD_M61_D / 2)

    # Отверстие с зазором M62 (through all)
    with Locations(Plane(origin=(750, 0, 0), x_dir=(0, 0, -1), z_dir=(1, 0, 0))):
        with Locations((-295, 33), (-225, 33), (-155, 33)):
            Hole(HOLE_WIZARD_M62_D / 2)


solid = part.part
